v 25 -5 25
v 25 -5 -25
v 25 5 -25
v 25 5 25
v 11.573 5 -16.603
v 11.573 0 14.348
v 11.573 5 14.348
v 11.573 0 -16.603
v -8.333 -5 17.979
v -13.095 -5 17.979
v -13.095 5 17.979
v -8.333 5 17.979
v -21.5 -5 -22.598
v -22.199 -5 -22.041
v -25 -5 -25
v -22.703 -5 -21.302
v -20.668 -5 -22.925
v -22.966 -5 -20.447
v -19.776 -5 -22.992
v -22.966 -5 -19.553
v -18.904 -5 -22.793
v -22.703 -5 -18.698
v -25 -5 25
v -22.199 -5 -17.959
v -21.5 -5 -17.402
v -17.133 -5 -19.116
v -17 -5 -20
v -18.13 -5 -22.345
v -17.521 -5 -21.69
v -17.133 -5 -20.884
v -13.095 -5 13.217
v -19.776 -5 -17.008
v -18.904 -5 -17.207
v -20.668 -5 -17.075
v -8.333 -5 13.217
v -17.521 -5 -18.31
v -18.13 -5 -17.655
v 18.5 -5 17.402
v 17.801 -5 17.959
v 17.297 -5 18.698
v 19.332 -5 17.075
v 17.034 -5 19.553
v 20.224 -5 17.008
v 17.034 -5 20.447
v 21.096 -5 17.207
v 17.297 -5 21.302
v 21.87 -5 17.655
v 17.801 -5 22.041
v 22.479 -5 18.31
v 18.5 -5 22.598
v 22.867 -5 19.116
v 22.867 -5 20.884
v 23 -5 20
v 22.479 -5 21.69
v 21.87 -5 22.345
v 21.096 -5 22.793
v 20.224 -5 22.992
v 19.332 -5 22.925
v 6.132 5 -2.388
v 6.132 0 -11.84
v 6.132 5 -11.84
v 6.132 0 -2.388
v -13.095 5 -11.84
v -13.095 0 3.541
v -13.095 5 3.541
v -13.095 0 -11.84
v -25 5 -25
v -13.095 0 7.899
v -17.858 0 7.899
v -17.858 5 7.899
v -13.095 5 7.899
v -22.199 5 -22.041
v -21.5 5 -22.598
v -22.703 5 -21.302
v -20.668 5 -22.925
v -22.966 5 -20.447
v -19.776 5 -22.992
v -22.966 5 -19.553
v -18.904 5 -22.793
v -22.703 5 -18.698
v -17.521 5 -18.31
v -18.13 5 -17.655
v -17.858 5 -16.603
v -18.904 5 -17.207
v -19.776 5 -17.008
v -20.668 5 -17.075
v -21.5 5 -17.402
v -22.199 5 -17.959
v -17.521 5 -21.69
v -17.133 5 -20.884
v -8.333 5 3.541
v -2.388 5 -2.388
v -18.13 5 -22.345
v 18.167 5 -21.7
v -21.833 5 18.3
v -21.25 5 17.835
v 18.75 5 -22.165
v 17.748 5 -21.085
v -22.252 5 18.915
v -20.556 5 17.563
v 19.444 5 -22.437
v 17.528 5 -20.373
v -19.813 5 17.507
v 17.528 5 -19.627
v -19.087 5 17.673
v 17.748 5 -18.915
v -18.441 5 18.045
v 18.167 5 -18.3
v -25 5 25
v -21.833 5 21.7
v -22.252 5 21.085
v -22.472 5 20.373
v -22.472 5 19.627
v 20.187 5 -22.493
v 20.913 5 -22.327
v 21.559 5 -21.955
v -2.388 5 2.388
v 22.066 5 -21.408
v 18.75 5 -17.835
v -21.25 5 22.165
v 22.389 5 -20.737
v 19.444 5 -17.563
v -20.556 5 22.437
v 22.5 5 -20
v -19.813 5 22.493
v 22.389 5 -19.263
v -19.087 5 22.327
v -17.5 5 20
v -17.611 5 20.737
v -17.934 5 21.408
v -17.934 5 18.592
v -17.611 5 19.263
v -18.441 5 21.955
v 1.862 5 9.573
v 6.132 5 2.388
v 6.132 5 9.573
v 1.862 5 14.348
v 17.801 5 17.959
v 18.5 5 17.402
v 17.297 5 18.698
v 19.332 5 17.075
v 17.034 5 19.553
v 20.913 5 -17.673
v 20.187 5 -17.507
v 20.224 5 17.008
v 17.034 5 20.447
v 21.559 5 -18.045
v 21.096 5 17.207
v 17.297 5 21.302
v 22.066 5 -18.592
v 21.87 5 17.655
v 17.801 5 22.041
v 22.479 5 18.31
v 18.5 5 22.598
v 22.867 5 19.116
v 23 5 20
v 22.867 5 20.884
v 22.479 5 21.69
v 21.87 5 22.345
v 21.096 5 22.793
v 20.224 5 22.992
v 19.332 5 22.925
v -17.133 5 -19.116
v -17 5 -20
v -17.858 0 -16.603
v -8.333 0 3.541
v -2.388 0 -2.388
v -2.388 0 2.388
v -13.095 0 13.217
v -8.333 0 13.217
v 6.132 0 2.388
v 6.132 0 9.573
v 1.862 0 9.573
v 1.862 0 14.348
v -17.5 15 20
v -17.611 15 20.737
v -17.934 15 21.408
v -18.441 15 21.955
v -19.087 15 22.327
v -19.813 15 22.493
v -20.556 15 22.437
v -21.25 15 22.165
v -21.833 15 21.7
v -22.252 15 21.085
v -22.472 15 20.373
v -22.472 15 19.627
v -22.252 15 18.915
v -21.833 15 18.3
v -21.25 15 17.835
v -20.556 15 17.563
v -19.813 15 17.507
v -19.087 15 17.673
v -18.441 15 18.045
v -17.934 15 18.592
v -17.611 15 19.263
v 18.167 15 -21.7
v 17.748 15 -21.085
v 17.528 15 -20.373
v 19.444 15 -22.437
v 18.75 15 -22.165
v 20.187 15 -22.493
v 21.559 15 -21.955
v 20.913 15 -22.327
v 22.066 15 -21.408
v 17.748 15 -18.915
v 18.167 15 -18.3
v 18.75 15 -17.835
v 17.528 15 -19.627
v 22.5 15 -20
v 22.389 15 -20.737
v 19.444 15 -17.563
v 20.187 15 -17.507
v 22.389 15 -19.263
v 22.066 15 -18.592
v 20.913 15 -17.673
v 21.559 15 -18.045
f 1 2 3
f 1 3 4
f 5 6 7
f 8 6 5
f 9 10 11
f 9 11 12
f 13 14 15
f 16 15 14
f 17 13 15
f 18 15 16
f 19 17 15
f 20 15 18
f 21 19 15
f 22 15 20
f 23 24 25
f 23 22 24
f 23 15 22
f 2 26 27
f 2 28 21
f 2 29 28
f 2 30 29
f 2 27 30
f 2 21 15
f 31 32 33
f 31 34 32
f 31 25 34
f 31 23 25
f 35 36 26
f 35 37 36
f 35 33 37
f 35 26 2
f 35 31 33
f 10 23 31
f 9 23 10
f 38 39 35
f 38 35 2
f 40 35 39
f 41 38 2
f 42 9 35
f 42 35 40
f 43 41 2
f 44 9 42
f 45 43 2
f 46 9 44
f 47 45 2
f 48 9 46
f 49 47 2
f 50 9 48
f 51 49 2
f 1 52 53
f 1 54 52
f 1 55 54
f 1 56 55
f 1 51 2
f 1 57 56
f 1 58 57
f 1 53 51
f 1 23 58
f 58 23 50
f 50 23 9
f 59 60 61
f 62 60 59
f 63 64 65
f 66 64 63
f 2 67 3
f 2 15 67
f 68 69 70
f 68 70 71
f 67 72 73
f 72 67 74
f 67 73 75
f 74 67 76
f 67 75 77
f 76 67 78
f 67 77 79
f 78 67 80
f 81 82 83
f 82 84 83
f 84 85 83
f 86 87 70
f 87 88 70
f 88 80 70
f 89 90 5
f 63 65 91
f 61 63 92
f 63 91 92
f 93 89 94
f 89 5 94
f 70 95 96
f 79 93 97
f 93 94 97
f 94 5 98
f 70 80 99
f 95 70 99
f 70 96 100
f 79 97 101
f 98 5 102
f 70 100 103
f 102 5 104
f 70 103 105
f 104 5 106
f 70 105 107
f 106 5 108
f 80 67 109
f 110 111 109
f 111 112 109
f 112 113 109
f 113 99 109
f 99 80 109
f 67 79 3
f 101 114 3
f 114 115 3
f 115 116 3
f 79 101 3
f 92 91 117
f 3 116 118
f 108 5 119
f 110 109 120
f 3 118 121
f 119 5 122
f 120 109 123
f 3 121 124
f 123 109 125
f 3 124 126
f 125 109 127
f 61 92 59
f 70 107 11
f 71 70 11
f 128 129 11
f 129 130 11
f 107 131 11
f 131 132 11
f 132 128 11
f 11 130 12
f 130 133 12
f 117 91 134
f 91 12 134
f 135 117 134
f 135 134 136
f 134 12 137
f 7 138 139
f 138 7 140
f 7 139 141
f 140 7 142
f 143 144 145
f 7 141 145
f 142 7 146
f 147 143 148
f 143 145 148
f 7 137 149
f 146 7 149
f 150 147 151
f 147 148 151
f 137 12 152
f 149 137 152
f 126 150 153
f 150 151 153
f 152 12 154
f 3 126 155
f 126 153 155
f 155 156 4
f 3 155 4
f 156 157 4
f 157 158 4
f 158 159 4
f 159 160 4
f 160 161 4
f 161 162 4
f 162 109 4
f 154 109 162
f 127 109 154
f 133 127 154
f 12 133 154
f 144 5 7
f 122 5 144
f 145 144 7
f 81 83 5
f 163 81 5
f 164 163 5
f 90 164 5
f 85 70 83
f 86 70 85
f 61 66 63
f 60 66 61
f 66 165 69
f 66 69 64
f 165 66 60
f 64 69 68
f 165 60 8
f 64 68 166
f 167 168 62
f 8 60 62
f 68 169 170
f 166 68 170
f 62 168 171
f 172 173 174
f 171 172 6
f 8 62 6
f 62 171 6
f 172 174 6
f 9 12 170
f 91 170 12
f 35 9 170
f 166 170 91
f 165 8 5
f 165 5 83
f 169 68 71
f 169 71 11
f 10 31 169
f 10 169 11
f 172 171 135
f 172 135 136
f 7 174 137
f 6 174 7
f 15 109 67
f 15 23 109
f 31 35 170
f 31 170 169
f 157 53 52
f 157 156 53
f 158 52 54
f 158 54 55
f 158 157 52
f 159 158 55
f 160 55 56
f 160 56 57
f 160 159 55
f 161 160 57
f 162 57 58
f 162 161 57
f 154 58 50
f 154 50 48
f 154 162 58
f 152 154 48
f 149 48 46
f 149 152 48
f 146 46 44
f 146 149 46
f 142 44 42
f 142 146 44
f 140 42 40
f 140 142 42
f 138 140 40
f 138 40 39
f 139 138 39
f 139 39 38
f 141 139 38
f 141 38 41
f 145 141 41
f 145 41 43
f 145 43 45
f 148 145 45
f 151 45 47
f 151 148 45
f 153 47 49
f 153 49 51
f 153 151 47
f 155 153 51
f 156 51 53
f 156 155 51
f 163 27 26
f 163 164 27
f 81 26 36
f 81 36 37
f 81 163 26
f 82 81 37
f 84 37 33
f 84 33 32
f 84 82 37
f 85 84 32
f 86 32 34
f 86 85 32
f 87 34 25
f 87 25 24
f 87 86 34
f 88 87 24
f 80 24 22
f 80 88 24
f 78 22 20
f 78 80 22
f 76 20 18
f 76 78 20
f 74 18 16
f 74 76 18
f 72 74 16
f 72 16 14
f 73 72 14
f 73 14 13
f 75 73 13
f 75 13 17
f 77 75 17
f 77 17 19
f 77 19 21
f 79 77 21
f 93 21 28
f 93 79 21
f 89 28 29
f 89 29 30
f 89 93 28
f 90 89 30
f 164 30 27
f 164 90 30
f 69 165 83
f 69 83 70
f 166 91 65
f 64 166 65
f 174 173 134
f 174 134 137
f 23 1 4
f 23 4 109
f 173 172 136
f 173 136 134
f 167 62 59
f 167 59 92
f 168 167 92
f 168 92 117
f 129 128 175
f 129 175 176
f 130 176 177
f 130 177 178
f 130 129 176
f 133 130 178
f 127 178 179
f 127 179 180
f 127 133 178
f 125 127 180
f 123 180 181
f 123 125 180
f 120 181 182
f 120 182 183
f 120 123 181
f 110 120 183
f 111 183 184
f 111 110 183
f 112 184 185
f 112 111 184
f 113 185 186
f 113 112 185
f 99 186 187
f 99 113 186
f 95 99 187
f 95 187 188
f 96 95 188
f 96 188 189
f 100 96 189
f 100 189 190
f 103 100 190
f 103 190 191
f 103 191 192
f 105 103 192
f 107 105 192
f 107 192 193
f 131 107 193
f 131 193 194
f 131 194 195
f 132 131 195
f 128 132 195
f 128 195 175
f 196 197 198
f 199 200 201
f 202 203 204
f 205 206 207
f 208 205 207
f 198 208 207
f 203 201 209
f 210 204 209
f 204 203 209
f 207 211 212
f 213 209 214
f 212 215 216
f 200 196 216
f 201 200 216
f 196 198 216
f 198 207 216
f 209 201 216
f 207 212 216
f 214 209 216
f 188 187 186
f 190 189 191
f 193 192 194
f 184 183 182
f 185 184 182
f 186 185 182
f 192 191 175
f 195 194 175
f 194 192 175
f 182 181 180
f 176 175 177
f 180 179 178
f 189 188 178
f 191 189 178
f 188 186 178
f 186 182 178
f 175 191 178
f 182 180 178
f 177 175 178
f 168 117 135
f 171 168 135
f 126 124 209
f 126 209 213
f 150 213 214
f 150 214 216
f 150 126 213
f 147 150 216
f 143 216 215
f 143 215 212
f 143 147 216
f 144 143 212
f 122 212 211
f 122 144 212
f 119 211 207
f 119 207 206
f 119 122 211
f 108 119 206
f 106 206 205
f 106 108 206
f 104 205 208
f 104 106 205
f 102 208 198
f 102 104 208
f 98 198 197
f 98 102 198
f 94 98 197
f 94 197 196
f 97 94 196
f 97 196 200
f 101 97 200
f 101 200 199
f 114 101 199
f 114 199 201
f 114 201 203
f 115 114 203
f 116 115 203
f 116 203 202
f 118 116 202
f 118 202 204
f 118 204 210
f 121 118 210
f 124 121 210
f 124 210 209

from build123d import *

# Parameters (mm, degrees)
F0_R          = 3
F0_R_2        = 2.5
F1_DEPTH      = 5
F0_W          = 4.7752
F0_H          = 4.7752
F2_DEPTH      = 5
F3_DEPTH      = 15
F3_DEPTH_BACK = 5


with BuildPart() as f1:
    # F0 (on Front) → F1 (new body, symmetric)
    with BuildSketch(Plane.XZ):
        Polygon((-25, -25), (25, -25), (25, 25), (-13.09502, 25), (-25, 25), align=None)
        with Locations((-20, -20)):
            Circle(F0_R, mode=Mode.SUBTRACT)
        with Locations((20, -20)):
            Circle(F0_R_2, mode=Mode.SUBTRACT)
        Polygon((-13.09502, 13.21694), (-13.09502, 17.97944), (-8.33252, 17.97944), (-8.33252, 13.21694), (-8.33252, 3.5414441053), (-13.09502, 3.5414441053), (-13.09502, -11.8404025305), (-4.4399380628, -11.8404025305), (6.1322724736, -11.8404025305), (6.1322724736, -2.3876), (2.3876, -2.3876), (-2.3876, -2.3876), (-2.3876, 2.3876), (2.3876, 2.3876), (6.1322724736, 2.3876), (6.1322724736, 9.5728570595), (1.8619408365, 9.5728570595), (1.8619408365, 14.3480570595), (8.9338924736, 14.3480570595), (11.5732288948, 14.3480570595), (11.5732288948, 13.8279201027), (11.5732288948, 9.2561525788), (11.5732288948, 2.3876), (11.5732288948, -2.3876), (11.5732288948, -16.6029025305), (-17.85752, -16.6029025305), (-17.85752, 3.5414441053), (-17.85752, 7.8989091825), (-13.09502, 7.8989091825), align=None, mode=Mode.SUBTRACT)
        with Locations((-20, 20)):
            Circle(F0_R_2, mode=Mode.SUBTRACT)
        with Locations((20, 20)):
            Circle(F0_R, mode=Mode.SUBTRACT)
    extrude(amount=F1_DEPTH, both=True)

    # F0 (on Front) → F2 (join)
    with BuildSketch(Plane.XZ):
        Polygon((-8.33252, 13.21694), (-13.09502, 13.21694), (-13.09502, 7.8989091825), (-17.85752, 7.8989091825), (-17.85752, 3.5414441053), (-17.85752, -16.6029025305), (11.5732288948, -16.6029025305), (11.5732288948, -2.3876), (11.5732288948, 2.3876), (11.5732288948, 9.2561525788), (11.5732288948, 13.8279201027), (11.5732288948, 14.3480570595), (8.9338924736, 14.3480570595), (1.8619408365, 14.3480570595), (1.8619408365, 9.5728570595), (6.1322724736, 9.5728570595), (6.1322724736, 2.3876), (2.3876, 2.3876), (2.3876, -2.3876), (6.1322724736, -2.3876), (6.1322724736, -11.8404025305), (-4.4399380628, -11.8404025305), (-13.09502, -11.8404025305), (-13.09502, 3.5414441053), (-8.33252, 3.5414441053), align=None)
        Rectangle(F0_W, F0_H)
    extrude(amount=F2_DEPTH)

    # F0 (on Front) → F3 (join, two sides)
    with BuildSketch(Plane.XZ) as f3_sk:
        with Locations((-20, 20)):
            Circle(F0_R_2)
        with Locations((20, -20)):
            Circle(F0_R_2)
    extrude(amount=-F3_DEPTH)
    extrude(f3_sk.sketch, amount=F3_DEPTH_BACK)


solid = f1.part
